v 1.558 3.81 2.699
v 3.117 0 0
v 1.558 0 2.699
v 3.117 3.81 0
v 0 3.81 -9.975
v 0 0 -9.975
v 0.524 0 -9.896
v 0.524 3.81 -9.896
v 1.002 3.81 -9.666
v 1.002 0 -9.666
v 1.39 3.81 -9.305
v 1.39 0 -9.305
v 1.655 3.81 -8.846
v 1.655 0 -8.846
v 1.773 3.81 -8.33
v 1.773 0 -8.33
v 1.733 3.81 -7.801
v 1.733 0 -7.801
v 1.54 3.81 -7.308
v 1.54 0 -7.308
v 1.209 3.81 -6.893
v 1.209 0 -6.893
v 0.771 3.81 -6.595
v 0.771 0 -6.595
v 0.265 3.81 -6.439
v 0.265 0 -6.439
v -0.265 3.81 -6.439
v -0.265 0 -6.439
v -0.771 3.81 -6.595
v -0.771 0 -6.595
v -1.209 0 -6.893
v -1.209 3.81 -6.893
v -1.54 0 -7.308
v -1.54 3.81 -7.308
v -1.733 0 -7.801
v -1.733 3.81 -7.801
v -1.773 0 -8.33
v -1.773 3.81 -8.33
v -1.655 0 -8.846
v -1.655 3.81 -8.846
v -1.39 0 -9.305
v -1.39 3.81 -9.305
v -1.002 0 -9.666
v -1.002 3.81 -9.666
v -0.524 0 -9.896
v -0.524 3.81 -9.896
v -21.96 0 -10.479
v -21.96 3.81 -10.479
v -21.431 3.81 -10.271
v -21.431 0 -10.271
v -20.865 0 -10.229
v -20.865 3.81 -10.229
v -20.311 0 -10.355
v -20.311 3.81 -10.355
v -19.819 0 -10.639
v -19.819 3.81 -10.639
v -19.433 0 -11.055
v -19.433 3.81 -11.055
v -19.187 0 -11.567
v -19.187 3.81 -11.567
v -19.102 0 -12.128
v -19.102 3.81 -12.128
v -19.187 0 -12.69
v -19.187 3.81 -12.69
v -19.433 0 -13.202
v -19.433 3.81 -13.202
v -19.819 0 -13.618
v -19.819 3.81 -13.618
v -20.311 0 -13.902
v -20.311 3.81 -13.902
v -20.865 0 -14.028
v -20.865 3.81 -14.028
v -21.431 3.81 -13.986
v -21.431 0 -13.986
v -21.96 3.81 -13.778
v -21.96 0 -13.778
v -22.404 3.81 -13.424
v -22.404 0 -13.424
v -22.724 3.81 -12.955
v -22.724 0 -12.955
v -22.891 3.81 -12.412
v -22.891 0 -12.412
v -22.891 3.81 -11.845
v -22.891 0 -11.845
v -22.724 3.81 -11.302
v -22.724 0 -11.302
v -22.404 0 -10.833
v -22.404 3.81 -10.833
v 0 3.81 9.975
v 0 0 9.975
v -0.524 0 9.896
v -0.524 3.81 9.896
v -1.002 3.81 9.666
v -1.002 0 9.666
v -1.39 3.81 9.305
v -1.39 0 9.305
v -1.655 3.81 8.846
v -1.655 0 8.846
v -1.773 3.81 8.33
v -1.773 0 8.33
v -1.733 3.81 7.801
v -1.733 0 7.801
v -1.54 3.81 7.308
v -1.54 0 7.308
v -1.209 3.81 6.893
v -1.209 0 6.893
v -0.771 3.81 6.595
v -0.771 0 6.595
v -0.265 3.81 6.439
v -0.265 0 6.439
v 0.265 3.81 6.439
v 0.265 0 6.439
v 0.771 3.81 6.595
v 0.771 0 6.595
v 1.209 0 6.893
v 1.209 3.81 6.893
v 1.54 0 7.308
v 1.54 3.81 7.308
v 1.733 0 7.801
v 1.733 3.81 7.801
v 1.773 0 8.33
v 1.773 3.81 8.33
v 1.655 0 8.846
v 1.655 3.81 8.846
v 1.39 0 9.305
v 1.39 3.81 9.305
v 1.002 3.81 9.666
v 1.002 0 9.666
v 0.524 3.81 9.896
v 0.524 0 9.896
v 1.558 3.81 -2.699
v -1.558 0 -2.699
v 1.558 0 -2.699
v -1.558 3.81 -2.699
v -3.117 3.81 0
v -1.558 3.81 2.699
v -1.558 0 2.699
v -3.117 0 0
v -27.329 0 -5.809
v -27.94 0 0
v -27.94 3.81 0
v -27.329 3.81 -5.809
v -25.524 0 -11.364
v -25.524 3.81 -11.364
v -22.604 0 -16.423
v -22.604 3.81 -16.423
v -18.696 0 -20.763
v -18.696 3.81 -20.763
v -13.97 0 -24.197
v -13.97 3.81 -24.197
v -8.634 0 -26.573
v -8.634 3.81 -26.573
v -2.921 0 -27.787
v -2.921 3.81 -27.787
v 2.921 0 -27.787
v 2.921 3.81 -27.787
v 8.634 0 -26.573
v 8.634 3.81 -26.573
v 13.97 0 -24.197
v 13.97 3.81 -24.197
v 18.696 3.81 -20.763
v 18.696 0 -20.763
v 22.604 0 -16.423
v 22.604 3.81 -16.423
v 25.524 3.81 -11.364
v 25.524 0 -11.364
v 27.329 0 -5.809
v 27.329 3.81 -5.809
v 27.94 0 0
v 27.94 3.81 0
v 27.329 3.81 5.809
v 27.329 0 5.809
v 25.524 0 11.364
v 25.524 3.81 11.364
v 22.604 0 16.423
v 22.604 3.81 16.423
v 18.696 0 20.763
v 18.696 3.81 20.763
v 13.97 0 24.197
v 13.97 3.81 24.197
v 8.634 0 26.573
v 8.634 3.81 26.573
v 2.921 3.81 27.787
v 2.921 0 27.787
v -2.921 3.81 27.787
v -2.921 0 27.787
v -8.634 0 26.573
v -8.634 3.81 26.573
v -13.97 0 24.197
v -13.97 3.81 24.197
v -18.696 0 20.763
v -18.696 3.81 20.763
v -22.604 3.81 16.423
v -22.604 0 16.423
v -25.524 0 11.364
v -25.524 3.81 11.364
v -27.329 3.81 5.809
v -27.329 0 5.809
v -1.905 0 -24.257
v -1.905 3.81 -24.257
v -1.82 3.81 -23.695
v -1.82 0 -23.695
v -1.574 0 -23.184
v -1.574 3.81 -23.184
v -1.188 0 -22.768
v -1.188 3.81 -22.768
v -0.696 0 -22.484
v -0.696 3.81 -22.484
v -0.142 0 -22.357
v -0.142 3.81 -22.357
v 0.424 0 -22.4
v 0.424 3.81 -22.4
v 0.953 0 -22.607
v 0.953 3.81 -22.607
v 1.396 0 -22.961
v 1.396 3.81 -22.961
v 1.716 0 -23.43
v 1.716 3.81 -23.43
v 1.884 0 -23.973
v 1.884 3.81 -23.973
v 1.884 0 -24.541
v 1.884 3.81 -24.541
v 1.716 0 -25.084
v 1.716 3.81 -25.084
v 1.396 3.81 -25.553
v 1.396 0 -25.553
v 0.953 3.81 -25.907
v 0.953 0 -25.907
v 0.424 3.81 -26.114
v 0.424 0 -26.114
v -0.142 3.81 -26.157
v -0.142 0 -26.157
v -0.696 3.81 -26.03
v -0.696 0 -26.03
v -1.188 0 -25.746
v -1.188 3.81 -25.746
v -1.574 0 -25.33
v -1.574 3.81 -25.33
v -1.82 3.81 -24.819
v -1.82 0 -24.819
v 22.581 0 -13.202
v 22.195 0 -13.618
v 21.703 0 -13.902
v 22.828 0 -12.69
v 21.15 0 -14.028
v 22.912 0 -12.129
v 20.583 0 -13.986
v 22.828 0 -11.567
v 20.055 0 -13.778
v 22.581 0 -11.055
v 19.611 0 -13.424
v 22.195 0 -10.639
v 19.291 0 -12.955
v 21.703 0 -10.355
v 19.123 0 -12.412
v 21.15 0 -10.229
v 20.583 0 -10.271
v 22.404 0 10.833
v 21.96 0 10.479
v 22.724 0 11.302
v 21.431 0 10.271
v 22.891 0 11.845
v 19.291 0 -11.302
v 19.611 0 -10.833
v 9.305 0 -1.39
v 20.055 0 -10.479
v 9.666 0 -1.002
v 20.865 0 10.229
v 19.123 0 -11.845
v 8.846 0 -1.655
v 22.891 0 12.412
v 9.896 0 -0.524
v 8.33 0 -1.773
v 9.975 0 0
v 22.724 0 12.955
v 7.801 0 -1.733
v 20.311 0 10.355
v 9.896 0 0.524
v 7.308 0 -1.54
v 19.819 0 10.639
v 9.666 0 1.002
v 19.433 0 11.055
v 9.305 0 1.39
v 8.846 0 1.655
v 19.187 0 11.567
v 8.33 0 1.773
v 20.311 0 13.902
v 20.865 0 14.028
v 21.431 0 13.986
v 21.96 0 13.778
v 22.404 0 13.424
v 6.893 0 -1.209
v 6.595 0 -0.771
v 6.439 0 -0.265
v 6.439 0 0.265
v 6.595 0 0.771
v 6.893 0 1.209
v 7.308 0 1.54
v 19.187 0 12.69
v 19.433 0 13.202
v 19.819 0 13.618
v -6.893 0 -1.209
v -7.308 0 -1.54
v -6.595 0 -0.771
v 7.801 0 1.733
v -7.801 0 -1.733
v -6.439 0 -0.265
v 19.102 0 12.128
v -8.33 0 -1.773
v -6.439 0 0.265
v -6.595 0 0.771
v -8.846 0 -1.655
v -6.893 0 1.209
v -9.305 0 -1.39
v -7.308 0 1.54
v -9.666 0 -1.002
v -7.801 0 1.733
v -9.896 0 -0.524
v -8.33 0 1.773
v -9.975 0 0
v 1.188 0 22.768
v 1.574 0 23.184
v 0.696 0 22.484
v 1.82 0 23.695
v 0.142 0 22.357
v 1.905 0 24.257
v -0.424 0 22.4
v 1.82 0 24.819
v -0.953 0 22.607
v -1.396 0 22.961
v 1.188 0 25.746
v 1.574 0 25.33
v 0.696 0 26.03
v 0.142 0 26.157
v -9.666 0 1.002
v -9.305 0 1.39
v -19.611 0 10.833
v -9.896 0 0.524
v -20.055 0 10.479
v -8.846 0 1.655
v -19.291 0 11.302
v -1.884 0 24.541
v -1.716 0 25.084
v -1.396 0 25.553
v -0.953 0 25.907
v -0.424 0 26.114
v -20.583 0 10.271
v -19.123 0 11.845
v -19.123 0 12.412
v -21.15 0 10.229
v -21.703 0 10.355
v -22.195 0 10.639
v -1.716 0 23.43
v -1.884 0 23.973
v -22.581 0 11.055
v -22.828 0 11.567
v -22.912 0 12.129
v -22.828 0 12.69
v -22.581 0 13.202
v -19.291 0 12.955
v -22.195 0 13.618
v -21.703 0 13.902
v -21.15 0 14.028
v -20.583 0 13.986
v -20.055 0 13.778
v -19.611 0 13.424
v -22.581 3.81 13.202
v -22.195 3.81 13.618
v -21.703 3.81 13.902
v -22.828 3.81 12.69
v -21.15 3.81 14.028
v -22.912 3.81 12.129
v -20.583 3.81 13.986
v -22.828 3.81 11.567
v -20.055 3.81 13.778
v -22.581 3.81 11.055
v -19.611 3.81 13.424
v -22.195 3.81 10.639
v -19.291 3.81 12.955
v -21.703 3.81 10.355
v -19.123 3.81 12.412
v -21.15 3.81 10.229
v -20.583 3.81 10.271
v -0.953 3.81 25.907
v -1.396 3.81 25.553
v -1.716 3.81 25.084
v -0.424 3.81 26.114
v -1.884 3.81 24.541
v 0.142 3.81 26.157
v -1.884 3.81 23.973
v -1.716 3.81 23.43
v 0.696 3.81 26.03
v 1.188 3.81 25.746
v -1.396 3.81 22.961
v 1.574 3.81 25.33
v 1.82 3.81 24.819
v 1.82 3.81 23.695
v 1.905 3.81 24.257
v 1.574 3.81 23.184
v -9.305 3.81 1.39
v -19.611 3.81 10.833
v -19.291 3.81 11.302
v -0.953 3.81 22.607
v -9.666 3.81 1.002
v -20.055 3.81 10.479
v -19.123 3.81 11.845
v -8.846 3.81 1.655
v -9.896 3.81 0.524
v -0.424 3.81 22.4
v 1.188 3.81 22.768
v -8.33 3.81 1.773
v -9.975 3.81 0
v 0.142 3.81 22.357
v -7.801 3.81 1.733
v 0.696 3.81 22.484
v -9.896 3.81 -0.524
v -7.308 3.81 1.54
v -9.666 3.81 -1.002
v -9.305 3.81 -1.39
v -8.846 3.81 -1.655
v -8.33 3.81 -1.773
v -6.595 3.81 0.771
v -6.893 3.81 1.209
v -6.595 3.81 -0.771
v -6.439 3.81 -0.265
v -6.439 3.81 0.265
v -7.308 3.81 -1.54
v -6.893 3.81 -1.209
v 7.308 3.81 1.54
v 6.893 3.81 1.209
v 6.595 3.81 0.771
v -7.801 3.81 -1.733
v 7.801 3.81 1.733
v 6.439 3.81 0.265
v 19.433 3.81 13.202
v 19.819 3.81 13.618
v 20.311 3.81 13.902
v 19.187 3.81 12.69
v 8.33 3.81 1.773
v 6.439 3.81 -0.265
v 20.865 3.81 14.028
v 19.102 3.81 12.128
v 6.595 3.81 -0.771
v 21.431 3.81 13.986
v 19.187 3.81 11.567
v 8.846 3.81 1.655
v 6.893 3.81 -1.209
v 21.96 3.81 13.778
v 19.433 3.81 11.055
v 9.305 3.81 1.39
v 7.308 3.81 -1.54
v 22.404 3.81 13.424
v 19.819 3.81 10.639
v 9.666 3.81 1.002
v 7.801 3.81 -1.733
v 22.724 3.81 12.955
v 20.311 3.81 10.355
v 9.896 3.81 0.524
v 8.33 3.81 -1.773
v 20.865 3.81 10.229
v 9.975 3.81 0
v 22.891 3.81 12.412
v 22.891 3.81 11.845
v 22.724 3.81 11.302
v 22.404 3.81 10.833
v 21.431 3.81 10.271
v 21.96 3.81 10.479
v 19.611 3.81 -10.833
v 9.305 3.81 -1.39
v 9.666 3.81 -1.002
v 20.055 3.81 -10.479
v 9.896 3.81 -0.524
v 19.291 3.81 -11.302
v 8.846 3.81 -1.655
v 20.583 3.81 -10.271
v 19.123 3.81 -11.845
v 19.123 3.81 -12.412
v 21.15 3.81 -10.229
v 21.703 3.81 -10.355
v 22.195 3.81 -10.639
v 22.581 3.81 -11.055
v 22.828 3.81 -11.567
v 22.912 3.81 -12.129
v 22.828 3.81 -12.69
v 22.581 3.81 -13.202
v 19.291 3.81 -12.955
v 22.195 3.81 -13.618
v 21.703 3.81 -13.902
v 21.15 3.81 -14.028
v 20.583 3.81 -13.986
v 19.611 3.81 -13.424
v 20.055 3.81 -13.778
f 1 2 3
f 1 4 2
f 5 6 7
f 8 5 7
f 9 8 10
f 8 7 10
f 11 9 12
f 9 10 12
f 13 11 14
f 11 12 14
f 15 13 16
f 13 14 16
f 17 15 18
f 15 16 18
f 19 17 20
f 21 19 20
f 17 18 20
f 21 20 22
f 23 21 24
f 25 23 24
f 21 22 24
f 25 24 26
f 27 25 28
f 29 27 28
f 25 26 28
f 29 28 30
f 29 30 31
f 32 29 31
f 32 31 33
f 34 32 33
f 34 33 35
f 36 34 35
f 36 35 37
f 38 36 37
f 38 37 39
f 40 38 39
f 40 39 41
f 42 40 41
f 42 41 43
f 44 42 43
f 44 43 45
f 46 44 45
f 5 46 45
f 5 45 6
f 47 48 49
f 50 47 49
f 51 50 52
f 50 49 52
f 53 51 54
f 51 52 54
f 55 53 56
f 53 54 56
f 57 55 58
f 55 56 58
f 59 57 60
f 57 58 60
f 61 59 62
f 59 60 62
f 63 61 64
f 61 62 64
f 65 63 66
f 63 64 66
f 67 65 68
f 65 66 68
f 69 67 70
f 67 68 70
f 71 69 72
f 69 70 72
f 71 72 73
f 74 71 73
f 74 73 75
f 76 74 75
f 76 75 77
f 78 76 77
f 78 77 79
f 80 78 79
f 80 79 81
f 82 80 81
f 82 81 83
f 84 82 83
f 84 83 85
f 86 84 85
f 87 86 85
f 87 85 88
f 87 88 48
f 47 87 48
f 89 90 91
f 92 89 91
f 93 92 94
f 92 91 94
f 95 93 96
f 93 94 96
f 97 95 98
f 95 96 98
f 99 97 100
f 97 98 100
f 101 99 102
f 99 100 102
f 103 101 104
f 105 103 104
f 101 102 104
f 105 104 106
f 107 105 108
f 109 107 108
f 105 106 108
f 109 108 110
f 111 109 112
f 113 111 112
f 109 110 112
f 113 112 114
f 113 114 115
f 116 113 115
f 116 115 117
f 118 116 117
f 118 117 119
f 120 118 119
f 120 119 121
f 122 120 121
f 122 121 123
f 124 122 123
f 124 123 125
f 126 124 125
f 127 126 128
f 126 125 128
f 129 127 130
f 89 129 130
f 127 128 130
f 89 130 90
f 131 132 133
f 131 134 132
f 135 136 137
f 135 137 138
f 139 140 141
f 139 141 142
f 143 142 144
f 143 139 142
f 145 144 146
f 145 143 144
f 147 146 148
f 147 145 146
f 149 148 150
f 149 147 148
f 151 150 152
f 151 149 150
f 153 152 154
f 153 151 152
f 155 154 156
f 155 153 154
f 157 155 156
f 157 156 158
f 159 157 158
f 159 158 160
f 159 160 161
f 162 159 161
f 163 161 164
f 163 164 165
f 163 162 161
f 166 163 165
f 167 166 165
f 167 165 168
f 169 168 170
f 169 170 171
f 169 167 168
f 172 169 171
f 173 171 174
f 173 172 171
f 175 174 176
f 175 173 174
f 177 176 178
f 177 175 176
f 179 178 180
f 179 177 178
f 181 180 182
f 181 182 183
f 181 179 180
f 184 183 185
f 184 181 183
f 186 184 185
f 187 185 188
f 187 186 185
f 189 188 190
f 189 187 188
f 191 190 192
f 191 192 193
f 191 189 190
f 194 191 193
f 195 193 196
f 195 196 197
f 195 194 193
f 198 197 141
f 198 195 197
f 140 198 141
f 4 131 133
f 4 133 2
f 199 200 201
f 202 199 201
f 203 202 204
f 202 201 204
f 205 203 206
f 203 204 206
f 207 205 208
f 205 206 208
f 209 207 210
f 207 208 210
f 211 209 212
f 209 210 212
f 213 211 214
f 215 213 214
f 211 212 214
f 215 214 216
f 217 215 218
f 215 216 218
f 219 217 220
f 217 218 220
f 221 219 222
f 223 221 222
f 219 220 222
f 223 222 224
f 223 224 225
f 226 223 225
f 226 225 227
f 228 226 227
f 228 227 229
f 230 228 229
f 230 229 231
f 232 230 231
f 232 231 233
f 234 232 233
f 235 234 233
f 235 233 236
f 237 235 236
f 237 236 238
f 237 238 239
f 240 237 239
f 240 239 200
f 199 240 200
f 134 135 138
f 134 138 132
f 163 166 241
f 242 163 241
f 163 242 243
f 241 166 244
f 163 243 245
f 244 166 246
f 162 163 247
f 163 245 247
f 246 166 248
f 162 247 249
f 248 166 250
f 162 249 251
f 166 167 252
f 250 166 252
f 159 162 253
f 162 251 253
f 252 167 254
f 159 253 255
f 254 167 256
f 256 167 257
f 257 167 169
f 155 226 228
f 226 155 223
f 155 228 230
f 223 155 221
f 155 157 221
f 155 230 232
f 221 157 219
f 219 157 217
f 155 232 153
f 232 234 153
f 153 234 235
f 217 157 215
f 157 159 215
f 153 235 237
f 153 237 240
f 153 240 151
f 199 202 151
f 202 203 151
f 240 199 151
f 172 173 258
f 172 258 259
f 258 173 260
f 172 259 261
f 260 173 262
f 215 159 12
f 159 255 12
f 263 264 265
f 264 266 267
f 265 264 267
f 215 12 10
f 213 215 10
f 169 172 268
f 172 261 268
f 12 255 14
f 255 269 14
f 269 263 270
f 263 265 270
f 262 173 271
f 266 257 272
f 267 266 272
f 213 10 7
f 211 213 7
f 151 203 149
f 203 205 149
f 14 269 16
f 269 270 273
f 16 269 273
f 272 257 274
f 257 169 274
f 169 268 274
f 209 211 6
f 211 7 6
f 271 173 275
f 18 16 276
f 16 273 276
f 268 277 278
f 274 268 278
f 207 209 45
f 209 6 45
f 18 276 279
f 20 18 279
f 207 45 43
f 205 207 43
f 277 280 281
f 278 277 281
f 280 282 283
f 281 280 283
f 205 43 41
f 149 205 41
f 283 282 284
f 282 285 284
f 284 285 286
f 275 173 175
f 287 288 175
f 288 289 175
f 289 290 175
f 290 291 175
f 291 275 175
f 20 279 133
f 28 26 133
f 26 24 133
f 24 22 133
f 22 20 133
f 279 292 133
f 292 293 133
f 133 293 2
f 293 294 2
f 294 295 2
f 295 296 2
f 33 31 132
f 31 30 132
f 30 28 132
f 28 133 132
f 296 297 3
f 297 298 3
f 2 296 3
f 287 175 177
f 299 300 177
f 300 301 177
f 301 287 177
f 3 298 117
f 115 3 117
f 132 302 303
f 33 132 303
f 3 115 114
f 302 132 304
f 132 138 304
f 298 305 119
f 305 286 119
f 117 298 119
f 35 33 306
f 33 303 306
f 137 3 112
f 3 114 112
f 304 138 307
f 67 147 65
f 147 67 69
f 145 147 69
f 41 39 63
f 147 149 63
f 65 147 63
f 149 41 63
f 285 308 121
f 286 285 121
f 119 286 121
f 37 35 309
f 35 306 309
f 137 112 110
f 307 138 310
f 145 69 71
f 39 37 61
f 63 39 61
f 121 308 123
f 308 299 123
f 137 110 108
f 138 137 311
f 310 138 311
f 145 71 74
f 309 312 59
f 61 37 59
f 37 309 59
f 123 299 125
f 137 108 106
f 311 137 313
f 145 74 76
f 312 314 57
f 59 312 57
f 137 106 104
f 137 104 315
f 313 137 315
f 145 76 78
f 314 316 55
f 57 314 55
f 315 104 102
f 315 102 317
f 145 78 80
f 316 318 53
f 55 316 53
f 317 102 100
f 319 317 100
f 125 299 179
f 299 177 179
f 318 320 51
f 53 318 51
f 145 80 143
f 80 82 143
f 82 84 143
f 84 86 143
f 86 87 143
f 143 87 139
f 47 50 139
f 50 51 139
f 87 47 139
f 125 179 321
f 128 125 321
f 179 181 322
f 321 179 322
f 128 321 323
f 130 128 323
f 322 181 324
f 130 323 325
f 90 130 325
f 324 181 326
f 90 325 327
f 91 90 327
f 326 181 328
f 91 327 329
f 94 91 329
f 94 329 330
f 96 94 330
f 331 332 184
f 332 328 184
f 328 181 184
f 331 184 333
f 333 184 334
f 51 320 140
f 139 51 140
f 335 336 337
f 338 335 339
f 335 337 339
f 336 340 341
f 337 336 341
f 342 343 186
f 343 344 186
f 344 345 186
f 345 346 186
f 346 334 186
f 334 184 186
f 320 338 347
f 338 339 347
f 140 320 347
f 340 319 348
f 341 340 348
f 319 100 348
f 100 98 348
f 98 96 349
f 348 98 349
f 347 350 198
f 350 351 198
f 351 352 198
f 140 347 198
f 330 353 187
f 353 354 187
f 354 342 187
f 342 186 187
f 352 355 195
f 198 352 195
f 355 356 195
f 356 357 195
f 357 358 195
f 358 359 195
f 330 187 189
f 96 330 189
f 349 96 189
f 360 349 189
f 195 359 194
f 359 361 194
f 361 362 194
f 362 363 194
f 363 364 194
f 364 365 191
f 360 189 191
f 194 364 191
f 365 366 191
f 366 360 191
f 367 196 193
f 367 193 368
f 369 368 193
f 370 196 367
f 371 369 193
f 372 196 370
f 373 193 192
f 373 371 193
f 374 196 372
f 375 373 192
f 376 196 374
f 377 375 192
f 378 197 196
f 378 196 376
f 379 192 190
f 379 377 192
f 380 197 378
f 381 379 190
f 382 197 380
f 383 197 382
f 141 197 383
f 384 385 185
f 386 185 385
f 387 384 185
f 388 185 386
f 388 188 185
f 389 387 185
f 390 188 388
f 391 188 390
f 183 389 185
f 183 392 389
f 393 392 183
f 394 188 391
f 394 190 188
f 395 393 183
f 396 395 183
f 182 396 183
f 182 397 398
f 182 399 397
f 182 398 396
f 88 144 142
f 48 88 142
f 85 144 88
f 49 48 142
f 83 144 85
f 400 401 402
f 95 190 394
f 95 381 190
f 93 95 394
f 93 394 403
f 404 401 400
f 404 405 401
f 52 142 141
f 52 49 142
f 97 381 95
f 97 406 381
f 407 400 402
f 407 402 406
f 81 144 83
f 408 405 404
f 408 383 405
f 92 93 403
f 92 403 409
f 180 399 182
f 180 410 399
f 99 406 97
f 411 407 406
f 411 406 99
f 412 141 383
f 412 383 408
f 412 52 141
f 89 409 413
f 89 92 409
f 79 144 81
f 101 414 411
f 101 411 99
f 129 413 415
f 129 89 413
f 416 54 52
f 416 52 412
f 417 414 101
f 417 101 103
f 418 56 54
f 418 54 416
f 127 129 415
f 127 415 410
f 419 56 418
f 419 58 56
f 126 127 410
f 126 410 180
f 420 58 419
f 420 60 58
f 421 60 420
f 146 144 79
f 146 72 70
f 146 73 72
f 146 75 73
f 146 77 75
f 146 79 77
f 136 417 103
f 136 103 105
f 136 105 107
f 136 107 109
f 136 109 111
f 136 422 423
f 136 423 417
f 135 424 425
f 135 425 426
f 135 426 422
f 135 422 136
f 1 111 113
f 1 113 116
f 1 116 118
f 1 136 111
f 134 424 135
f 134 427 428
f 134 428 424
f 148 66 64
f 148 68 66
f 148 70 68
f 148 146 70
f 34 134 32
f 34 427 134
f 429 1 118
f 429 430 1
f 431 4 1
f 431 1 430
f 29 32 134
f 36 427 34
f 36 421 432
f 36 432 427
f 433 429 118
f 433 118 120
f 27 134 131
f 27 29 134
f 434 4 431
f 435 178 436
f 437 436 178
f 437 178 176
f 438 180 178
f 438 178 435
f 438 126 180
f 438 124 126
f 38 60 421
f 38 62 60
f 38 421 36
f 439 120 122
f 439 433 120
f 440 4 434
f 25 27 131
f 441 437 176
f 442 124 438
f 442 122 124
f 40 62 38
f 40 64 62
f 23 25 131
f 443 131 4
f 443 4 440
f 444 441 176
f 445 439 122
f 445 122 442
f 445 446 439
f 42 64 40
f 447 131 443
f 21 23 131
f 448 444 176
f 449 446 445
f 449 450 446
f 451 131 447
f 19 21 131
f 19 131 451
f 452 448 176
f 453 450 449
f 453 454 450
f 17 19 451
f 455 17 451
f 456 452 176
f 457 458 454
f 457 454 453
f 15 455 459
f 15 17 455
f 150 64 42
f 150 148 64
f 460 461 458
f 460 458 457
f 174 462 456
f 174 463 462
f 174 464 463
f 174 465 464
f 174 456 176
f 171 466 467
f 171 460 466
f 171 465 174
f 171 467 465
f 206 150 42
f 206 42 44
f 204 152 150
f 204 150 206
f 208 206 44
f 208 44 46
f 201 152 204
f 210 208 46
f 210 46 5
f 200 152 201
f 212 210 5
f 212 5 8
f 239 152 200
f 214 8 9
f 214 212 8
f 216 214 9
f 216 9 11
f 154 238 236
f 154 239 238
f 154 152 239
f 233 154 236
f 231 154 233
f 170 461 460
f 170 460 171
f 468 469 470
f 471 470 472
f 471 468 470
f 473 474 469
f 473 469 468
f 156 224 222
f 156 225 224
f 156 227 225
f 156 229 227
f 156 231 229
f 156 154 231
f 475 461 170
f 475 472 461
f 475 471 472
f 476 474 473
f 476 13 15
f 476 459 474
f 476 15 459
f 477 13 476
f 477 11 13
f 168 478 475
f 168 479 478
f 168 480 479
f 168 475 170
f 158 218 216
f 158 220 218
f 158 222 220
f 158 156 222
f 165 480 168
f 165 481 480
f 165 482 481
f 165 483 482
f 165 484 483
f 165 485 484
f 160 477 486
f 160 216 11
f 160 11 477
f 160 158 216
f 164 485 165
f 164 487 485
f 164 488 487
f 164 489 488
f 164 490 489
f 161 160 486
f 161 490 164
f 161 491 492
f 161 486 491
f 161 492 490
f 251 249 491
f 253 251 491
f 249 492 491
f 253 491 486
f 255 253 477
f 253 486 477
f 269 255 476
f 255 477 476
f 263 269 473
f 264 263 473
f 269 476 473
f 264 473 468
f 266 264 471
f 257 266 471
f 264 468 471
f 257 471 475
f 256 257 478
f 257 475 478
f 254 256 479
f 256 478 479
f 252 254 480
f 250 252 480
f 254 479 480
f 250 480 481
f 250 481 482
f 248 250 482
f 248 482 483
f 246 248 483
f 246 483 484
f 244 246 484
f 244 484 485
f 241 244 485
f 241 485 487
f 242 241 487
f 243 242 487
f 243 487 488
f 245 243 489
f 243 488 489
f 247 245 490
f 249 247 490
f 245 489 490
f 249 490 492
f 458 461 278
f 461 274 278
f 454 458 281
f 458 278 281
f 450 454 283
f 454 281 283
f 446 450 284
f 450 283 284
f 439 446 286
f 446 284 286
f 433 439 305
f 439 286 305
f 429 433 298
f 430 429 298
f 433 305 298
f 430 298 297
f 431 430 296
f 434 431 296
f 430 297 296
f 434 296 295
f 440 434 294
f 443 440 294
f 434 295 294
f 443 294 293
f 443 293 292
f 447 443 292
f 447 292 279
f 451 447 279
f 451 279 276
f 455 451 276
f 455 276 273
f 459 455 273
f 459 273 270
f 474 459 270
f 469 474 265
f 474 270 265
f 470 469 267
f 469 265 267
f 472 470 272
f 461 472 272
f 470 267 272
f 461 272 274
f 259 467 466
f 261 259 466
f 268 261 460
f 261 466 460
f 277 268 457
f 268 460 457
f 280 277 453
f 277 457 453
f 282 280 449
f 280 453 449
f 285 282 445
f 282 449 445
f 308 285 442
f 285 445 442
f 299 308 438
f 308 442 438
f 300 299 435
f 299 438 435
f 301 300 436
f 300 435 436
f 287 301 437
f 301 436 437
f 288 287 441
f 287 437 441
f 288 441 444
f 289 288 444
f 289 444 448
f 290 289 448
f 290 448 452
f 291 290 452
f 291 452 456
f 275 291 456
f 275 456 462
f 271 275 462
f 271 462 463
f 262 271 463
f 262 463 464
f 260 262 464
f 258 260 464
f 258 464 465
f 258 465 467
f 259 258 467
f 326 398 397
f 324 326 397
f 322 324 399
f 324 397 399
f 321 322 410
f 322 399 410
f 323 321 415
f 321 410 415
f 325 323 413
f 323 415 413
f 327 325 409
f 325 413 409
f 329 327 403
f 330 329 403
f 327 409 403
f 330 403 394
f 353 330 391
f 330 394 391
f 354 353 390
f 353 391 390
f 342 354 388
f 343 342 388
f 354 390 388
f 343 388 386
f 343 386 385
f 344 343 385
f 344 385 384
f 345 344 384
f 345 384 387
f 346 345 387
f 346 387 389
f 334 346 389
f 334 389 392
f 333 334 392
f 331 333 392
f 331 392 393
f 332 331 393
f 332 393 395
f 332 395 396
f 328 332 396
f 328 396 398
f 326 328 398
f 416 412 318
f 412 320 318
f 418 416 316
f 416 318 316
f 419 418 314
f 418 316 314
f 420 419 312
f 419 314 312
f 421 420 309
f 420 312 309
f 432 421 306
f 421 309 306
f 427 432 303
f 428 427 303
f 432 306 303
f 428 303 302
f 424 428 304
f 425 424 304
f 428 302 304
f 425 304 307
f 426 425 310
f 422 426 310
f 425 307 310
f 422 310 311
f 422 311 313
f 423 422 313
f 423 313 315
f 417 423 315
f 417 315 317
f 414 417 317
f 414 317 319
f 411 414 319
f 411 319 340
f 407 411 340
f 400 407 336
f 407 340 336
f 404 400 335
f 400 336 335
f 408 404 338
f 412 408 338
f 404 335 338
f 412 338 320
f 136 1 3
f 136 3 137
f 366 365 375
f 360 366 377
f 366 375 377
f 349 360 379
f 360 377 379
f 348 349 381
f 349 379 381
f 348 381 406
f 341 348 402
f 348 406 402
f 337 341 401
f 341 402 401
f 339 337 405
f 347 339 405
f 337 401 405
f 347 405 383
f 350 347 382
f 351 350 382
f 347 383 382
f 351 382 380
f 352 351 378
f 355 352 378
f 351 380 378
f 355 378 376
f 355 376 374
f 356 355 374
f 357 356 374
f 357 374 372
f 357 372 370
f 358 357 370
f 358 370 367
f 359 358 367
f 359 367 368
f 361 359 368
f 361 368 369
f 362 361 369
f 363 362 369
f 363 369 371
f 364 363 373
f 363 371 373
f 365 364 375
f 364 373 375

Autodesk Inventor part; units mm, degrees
ref_plane "YZ Plane" through (0, 0, 0) normal (1, 0, 0) x (0, 1, 0)
sketch "Sketch1" plane through (0, 0, 0) normal (0, 1, 0) x (-1, 0, 0)
  circle A0 centre (0, 0) radius 27.94
  dimension "d0" = 55.88
extrude "Extrusion1" add sketch "Sketch1" along normal blind 7.62
ref_plane "Work Plane5" through (0, 21.082, 0) normal (0, 1, 0) x (1, 0, 0)
sketch "Sketch5" plane through (0, 21.082, 0) normal (0, 1, 0) x (1, 0, 0)
  line L0 (0, 0) -> (0, 2.667)
  line L1 (-3.1168, 0) -> (-1.5584, 2.6992)
  line L2 (-1.5584, 2.6992) -> (1.5584, 2.6992)
  line L3 (1.5584, 2.6992) -> (3.1168, 0)
  line L4 (3.1168, 0) -> (1.5584, -2.6992)
  line L5 (1.5584, -2.6992) -> (-1.5584, -2.6992)
  line L6 (-1.5584, -2.6992) -> (-3.1168, 0)
  dimension "d10" = 2.667
extrude "Extrusion4" cut sketch "Sketch5" against normal blind 25.4
sketch "Sketch6" plane through (0, 7.62, 0) normal (0, 1, 0) x (1, 0, 0)
  circle A0 centre (0, 0) radius 27.94 projected
  line L0 (0, -27.94) -> (0, -26.162)
  line L1 (0, -26.162) -> (0, -24.257)
  circle A1 centre (0, -24.257) radius 1.905
  dimension "d13" = 1.778
  dimension "d14" = 1.905
extrude "Extrusion5" cut sketch "Sketch6" against normal blind 25.4 contours A1
ref_plane "Work Plane6" through (0, 21.082, 0) normal (0, 1, 0) x (1, 0, 0)
pattern_circular "Circular Pattern1" count 6 over 360 about axis through (0, 21.082, 0) along (0, 1, 0) of "Extrusion5"
sketch "Sketch8" plane through (0, 0, 0) normal (0, -1, 0) x (1, 0, 0)
  line L0 (3.1168, 0) -> (1.5584, -2.6992) projected
  line L1 (3.1168, 0) -> (6.4188, 0)
  line L2 (6.4188, 0) -> (8.1968, 0)
  circle A0 centre (8.1968, 0) radius 1.778
  point P0 (0, 0)
  dimension "d20" = 3.302
  dimension "d21" = 1.778
extrude "Extrusion6" cut sketch "Sketch8" against normal blind 25.4
pattern_circular "Circular Pattern2" count 4 over 360 about axis through (0, 21.082, 0) along (0, 1, 0) of "Extrusion6"
sketch "Sketch10" plane through (0, 7.62, 0) normal (0, 1, 0) x (1, 0, 0)
  circle A0 centre (0, 0) radius 27.94
extrude "Extrusion8" cut sketch "Sketch10" against normal blind 3.81
properties part number "Wheel Mount"
